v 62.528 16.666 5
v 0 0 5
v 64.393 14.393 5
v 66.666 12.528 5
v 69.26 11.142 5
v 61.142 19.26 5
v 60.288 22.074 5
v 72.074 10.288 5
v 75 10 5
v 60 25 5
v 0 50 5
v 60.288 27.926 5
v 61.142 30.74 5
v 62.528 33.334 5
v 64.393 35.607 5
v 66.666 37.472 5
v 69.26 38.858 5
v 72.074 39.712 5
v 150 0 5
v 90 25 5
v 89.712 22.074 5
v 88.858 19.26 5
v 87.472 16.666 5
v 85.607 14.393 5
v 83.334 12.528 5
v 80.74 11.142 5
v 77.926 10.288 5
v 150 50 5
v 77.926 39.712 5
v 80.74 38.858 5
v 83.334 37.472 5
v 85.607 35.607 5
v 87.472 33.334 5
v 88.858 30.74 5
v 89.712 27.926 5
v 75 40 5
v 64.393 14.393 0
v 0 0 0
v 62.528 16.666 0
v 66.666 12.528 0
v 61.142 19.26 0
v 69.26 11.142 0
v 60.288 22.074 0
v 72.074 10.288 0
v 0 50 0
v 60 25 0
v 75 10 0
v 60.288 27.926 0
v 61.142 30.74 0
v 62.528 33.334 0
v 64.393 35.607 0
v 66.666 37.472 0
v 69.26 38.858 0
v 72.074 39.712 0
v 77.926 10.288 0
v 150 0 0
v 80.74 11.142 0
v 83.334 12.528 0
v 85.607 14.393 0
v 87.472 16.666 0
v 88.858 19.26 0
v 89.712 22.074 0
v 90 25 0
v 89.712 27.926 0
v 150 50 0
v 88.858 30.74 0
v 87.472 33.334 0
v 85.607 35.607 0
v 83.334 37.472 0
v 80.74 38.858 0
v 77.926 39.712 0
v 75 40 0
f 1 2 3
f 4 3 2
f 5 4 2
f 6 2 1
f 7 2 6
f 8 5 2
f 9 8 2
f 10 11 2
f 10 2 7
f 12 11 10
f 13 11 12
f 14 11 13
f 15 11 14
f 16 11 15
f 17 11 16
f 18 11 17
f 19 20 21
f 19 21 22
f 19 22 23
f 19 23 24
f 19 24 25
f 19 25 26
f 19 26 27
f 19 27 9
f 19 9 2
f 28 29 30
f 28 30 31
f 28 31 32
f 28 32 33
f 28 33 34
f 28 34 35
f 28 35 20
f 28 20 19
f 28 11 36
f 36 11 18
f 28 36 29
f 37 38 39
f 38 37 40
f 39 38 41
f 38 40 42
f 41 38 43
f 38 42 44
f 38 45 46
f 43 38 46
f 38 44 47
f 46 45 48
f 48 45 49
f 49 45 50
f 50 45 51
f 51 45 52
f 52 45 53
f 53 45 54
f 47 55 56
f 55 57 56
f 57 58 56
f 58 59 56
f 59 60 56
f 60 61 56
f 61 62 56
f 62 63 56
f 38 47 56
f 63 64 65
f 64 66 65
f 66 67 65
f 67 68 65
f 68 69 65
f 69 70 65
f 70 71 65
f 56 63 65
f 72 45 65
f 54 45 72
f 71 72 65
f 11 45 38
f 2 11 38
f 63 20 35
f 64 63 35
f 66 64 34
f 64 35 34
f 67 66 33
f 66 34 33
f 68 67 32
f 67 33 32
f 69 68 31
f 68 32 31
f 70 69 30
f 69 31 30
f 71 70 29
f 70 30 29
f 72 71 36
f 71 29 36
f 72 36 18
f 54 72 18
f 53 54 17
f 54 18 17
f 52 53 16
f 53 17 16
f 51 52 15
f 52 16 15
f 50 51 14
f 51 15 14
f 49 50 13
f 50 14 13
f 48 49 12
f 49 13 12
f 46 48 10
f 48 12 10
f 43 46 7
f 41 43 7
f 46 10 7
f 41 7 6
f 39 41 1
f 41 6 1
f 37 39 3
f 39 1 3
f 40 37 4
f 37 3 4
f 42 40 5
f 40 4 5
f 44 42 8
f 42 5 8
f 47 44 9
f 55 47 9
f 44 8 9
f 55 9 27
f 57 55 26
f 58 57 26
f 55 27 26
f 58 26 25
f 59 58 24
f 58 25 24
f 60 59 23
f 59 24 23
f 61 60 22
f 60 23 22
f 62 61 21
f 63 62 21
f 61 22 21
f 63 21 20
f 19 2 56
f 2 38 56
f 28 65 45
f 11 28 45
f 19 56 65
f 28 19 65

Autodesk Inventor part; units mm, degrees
ref_plane "YZ Plane" through (0, 0, 0) normal (1, 0, 0) x (0, 1, 0)
ref_plane "XZ Plane" through (0, 0, 0) normal (0, 1, 0) x (-1, 0, 0)
ref_plane "XY Plane" through (0, 0, 0) normal (0, 0, 1) x (1, 0, 0)
sketch "Sketch1" plane through (0, 0, 0) normal (0, 0, 1) x (1, 0, 0)
  point P0 (0, 0)
sketch "Sketch2" plane through (0, 0, 0) normal (0, 0, 1) x (1, 0, 0)
  line L0 (0, 0) -> (150, 0)
  line L1 (150, 0) -> (150, 50)
  line L2 (150, 50) -> (0, 50)
  line L3 (0, 50) -> (0, 0)
  dimension "d0" = 150
  dimension "d1" = 50
extrude "Extrusion1" add sketch "Sketch2" along normal blind 5
sketch "Sketch3" plane through (0, 0, 5) normal (0, 0, 1) x (1, 0, 0)
  line L0 (0, 0) -> (0, 25)
  line L1 (0, 50) -> (0, 0) projected
  arc A0 (20.6375, 23.8125) -> (0, 25) centre (0, -154.9228) ccw
  dimension "d4" = 25
sketch "Sketch4" plane through (0, 0, 5) normal (0, 0, 1) x (1, 0, 0)
  point P0 (0, 0)
sketch "Sketch5" plane through (0, 0, 5) normal (0, 0, 1) x (1, 0, 0)
  line L0 (0, 0) -> (150, 0) projected
  line L1 (150, 0) -> (150, 25)
  line L2 (150, 0) -> (150, 50) projected
  dimension "d5" = 25
sketch "Sketch6" plane through (0, 0, 5) normal (0, 0, 1) x (1, 0, 0)
  line L0 (150, 0) -> (150, 50) projected
  line L1 (150, 25) -> (90, 25)
  line L2 (90, 25) -> (60, 25)
  line L3 (60, 25) -> (0, 25)
  line L4 (0, 25) -> (75, 25)
  circle A0 centre (75, 25) radius 15
  point P0 (0, 0)
  dimension "d6" = 60
  dimension "d7" = 30
  dimension "d8" = 60
  dimension "d9" = 75
  dimension "d10" = 30
extrude "Extrusion2" cut sketch "Sketch6" against normal through all
properties part number "kj"
